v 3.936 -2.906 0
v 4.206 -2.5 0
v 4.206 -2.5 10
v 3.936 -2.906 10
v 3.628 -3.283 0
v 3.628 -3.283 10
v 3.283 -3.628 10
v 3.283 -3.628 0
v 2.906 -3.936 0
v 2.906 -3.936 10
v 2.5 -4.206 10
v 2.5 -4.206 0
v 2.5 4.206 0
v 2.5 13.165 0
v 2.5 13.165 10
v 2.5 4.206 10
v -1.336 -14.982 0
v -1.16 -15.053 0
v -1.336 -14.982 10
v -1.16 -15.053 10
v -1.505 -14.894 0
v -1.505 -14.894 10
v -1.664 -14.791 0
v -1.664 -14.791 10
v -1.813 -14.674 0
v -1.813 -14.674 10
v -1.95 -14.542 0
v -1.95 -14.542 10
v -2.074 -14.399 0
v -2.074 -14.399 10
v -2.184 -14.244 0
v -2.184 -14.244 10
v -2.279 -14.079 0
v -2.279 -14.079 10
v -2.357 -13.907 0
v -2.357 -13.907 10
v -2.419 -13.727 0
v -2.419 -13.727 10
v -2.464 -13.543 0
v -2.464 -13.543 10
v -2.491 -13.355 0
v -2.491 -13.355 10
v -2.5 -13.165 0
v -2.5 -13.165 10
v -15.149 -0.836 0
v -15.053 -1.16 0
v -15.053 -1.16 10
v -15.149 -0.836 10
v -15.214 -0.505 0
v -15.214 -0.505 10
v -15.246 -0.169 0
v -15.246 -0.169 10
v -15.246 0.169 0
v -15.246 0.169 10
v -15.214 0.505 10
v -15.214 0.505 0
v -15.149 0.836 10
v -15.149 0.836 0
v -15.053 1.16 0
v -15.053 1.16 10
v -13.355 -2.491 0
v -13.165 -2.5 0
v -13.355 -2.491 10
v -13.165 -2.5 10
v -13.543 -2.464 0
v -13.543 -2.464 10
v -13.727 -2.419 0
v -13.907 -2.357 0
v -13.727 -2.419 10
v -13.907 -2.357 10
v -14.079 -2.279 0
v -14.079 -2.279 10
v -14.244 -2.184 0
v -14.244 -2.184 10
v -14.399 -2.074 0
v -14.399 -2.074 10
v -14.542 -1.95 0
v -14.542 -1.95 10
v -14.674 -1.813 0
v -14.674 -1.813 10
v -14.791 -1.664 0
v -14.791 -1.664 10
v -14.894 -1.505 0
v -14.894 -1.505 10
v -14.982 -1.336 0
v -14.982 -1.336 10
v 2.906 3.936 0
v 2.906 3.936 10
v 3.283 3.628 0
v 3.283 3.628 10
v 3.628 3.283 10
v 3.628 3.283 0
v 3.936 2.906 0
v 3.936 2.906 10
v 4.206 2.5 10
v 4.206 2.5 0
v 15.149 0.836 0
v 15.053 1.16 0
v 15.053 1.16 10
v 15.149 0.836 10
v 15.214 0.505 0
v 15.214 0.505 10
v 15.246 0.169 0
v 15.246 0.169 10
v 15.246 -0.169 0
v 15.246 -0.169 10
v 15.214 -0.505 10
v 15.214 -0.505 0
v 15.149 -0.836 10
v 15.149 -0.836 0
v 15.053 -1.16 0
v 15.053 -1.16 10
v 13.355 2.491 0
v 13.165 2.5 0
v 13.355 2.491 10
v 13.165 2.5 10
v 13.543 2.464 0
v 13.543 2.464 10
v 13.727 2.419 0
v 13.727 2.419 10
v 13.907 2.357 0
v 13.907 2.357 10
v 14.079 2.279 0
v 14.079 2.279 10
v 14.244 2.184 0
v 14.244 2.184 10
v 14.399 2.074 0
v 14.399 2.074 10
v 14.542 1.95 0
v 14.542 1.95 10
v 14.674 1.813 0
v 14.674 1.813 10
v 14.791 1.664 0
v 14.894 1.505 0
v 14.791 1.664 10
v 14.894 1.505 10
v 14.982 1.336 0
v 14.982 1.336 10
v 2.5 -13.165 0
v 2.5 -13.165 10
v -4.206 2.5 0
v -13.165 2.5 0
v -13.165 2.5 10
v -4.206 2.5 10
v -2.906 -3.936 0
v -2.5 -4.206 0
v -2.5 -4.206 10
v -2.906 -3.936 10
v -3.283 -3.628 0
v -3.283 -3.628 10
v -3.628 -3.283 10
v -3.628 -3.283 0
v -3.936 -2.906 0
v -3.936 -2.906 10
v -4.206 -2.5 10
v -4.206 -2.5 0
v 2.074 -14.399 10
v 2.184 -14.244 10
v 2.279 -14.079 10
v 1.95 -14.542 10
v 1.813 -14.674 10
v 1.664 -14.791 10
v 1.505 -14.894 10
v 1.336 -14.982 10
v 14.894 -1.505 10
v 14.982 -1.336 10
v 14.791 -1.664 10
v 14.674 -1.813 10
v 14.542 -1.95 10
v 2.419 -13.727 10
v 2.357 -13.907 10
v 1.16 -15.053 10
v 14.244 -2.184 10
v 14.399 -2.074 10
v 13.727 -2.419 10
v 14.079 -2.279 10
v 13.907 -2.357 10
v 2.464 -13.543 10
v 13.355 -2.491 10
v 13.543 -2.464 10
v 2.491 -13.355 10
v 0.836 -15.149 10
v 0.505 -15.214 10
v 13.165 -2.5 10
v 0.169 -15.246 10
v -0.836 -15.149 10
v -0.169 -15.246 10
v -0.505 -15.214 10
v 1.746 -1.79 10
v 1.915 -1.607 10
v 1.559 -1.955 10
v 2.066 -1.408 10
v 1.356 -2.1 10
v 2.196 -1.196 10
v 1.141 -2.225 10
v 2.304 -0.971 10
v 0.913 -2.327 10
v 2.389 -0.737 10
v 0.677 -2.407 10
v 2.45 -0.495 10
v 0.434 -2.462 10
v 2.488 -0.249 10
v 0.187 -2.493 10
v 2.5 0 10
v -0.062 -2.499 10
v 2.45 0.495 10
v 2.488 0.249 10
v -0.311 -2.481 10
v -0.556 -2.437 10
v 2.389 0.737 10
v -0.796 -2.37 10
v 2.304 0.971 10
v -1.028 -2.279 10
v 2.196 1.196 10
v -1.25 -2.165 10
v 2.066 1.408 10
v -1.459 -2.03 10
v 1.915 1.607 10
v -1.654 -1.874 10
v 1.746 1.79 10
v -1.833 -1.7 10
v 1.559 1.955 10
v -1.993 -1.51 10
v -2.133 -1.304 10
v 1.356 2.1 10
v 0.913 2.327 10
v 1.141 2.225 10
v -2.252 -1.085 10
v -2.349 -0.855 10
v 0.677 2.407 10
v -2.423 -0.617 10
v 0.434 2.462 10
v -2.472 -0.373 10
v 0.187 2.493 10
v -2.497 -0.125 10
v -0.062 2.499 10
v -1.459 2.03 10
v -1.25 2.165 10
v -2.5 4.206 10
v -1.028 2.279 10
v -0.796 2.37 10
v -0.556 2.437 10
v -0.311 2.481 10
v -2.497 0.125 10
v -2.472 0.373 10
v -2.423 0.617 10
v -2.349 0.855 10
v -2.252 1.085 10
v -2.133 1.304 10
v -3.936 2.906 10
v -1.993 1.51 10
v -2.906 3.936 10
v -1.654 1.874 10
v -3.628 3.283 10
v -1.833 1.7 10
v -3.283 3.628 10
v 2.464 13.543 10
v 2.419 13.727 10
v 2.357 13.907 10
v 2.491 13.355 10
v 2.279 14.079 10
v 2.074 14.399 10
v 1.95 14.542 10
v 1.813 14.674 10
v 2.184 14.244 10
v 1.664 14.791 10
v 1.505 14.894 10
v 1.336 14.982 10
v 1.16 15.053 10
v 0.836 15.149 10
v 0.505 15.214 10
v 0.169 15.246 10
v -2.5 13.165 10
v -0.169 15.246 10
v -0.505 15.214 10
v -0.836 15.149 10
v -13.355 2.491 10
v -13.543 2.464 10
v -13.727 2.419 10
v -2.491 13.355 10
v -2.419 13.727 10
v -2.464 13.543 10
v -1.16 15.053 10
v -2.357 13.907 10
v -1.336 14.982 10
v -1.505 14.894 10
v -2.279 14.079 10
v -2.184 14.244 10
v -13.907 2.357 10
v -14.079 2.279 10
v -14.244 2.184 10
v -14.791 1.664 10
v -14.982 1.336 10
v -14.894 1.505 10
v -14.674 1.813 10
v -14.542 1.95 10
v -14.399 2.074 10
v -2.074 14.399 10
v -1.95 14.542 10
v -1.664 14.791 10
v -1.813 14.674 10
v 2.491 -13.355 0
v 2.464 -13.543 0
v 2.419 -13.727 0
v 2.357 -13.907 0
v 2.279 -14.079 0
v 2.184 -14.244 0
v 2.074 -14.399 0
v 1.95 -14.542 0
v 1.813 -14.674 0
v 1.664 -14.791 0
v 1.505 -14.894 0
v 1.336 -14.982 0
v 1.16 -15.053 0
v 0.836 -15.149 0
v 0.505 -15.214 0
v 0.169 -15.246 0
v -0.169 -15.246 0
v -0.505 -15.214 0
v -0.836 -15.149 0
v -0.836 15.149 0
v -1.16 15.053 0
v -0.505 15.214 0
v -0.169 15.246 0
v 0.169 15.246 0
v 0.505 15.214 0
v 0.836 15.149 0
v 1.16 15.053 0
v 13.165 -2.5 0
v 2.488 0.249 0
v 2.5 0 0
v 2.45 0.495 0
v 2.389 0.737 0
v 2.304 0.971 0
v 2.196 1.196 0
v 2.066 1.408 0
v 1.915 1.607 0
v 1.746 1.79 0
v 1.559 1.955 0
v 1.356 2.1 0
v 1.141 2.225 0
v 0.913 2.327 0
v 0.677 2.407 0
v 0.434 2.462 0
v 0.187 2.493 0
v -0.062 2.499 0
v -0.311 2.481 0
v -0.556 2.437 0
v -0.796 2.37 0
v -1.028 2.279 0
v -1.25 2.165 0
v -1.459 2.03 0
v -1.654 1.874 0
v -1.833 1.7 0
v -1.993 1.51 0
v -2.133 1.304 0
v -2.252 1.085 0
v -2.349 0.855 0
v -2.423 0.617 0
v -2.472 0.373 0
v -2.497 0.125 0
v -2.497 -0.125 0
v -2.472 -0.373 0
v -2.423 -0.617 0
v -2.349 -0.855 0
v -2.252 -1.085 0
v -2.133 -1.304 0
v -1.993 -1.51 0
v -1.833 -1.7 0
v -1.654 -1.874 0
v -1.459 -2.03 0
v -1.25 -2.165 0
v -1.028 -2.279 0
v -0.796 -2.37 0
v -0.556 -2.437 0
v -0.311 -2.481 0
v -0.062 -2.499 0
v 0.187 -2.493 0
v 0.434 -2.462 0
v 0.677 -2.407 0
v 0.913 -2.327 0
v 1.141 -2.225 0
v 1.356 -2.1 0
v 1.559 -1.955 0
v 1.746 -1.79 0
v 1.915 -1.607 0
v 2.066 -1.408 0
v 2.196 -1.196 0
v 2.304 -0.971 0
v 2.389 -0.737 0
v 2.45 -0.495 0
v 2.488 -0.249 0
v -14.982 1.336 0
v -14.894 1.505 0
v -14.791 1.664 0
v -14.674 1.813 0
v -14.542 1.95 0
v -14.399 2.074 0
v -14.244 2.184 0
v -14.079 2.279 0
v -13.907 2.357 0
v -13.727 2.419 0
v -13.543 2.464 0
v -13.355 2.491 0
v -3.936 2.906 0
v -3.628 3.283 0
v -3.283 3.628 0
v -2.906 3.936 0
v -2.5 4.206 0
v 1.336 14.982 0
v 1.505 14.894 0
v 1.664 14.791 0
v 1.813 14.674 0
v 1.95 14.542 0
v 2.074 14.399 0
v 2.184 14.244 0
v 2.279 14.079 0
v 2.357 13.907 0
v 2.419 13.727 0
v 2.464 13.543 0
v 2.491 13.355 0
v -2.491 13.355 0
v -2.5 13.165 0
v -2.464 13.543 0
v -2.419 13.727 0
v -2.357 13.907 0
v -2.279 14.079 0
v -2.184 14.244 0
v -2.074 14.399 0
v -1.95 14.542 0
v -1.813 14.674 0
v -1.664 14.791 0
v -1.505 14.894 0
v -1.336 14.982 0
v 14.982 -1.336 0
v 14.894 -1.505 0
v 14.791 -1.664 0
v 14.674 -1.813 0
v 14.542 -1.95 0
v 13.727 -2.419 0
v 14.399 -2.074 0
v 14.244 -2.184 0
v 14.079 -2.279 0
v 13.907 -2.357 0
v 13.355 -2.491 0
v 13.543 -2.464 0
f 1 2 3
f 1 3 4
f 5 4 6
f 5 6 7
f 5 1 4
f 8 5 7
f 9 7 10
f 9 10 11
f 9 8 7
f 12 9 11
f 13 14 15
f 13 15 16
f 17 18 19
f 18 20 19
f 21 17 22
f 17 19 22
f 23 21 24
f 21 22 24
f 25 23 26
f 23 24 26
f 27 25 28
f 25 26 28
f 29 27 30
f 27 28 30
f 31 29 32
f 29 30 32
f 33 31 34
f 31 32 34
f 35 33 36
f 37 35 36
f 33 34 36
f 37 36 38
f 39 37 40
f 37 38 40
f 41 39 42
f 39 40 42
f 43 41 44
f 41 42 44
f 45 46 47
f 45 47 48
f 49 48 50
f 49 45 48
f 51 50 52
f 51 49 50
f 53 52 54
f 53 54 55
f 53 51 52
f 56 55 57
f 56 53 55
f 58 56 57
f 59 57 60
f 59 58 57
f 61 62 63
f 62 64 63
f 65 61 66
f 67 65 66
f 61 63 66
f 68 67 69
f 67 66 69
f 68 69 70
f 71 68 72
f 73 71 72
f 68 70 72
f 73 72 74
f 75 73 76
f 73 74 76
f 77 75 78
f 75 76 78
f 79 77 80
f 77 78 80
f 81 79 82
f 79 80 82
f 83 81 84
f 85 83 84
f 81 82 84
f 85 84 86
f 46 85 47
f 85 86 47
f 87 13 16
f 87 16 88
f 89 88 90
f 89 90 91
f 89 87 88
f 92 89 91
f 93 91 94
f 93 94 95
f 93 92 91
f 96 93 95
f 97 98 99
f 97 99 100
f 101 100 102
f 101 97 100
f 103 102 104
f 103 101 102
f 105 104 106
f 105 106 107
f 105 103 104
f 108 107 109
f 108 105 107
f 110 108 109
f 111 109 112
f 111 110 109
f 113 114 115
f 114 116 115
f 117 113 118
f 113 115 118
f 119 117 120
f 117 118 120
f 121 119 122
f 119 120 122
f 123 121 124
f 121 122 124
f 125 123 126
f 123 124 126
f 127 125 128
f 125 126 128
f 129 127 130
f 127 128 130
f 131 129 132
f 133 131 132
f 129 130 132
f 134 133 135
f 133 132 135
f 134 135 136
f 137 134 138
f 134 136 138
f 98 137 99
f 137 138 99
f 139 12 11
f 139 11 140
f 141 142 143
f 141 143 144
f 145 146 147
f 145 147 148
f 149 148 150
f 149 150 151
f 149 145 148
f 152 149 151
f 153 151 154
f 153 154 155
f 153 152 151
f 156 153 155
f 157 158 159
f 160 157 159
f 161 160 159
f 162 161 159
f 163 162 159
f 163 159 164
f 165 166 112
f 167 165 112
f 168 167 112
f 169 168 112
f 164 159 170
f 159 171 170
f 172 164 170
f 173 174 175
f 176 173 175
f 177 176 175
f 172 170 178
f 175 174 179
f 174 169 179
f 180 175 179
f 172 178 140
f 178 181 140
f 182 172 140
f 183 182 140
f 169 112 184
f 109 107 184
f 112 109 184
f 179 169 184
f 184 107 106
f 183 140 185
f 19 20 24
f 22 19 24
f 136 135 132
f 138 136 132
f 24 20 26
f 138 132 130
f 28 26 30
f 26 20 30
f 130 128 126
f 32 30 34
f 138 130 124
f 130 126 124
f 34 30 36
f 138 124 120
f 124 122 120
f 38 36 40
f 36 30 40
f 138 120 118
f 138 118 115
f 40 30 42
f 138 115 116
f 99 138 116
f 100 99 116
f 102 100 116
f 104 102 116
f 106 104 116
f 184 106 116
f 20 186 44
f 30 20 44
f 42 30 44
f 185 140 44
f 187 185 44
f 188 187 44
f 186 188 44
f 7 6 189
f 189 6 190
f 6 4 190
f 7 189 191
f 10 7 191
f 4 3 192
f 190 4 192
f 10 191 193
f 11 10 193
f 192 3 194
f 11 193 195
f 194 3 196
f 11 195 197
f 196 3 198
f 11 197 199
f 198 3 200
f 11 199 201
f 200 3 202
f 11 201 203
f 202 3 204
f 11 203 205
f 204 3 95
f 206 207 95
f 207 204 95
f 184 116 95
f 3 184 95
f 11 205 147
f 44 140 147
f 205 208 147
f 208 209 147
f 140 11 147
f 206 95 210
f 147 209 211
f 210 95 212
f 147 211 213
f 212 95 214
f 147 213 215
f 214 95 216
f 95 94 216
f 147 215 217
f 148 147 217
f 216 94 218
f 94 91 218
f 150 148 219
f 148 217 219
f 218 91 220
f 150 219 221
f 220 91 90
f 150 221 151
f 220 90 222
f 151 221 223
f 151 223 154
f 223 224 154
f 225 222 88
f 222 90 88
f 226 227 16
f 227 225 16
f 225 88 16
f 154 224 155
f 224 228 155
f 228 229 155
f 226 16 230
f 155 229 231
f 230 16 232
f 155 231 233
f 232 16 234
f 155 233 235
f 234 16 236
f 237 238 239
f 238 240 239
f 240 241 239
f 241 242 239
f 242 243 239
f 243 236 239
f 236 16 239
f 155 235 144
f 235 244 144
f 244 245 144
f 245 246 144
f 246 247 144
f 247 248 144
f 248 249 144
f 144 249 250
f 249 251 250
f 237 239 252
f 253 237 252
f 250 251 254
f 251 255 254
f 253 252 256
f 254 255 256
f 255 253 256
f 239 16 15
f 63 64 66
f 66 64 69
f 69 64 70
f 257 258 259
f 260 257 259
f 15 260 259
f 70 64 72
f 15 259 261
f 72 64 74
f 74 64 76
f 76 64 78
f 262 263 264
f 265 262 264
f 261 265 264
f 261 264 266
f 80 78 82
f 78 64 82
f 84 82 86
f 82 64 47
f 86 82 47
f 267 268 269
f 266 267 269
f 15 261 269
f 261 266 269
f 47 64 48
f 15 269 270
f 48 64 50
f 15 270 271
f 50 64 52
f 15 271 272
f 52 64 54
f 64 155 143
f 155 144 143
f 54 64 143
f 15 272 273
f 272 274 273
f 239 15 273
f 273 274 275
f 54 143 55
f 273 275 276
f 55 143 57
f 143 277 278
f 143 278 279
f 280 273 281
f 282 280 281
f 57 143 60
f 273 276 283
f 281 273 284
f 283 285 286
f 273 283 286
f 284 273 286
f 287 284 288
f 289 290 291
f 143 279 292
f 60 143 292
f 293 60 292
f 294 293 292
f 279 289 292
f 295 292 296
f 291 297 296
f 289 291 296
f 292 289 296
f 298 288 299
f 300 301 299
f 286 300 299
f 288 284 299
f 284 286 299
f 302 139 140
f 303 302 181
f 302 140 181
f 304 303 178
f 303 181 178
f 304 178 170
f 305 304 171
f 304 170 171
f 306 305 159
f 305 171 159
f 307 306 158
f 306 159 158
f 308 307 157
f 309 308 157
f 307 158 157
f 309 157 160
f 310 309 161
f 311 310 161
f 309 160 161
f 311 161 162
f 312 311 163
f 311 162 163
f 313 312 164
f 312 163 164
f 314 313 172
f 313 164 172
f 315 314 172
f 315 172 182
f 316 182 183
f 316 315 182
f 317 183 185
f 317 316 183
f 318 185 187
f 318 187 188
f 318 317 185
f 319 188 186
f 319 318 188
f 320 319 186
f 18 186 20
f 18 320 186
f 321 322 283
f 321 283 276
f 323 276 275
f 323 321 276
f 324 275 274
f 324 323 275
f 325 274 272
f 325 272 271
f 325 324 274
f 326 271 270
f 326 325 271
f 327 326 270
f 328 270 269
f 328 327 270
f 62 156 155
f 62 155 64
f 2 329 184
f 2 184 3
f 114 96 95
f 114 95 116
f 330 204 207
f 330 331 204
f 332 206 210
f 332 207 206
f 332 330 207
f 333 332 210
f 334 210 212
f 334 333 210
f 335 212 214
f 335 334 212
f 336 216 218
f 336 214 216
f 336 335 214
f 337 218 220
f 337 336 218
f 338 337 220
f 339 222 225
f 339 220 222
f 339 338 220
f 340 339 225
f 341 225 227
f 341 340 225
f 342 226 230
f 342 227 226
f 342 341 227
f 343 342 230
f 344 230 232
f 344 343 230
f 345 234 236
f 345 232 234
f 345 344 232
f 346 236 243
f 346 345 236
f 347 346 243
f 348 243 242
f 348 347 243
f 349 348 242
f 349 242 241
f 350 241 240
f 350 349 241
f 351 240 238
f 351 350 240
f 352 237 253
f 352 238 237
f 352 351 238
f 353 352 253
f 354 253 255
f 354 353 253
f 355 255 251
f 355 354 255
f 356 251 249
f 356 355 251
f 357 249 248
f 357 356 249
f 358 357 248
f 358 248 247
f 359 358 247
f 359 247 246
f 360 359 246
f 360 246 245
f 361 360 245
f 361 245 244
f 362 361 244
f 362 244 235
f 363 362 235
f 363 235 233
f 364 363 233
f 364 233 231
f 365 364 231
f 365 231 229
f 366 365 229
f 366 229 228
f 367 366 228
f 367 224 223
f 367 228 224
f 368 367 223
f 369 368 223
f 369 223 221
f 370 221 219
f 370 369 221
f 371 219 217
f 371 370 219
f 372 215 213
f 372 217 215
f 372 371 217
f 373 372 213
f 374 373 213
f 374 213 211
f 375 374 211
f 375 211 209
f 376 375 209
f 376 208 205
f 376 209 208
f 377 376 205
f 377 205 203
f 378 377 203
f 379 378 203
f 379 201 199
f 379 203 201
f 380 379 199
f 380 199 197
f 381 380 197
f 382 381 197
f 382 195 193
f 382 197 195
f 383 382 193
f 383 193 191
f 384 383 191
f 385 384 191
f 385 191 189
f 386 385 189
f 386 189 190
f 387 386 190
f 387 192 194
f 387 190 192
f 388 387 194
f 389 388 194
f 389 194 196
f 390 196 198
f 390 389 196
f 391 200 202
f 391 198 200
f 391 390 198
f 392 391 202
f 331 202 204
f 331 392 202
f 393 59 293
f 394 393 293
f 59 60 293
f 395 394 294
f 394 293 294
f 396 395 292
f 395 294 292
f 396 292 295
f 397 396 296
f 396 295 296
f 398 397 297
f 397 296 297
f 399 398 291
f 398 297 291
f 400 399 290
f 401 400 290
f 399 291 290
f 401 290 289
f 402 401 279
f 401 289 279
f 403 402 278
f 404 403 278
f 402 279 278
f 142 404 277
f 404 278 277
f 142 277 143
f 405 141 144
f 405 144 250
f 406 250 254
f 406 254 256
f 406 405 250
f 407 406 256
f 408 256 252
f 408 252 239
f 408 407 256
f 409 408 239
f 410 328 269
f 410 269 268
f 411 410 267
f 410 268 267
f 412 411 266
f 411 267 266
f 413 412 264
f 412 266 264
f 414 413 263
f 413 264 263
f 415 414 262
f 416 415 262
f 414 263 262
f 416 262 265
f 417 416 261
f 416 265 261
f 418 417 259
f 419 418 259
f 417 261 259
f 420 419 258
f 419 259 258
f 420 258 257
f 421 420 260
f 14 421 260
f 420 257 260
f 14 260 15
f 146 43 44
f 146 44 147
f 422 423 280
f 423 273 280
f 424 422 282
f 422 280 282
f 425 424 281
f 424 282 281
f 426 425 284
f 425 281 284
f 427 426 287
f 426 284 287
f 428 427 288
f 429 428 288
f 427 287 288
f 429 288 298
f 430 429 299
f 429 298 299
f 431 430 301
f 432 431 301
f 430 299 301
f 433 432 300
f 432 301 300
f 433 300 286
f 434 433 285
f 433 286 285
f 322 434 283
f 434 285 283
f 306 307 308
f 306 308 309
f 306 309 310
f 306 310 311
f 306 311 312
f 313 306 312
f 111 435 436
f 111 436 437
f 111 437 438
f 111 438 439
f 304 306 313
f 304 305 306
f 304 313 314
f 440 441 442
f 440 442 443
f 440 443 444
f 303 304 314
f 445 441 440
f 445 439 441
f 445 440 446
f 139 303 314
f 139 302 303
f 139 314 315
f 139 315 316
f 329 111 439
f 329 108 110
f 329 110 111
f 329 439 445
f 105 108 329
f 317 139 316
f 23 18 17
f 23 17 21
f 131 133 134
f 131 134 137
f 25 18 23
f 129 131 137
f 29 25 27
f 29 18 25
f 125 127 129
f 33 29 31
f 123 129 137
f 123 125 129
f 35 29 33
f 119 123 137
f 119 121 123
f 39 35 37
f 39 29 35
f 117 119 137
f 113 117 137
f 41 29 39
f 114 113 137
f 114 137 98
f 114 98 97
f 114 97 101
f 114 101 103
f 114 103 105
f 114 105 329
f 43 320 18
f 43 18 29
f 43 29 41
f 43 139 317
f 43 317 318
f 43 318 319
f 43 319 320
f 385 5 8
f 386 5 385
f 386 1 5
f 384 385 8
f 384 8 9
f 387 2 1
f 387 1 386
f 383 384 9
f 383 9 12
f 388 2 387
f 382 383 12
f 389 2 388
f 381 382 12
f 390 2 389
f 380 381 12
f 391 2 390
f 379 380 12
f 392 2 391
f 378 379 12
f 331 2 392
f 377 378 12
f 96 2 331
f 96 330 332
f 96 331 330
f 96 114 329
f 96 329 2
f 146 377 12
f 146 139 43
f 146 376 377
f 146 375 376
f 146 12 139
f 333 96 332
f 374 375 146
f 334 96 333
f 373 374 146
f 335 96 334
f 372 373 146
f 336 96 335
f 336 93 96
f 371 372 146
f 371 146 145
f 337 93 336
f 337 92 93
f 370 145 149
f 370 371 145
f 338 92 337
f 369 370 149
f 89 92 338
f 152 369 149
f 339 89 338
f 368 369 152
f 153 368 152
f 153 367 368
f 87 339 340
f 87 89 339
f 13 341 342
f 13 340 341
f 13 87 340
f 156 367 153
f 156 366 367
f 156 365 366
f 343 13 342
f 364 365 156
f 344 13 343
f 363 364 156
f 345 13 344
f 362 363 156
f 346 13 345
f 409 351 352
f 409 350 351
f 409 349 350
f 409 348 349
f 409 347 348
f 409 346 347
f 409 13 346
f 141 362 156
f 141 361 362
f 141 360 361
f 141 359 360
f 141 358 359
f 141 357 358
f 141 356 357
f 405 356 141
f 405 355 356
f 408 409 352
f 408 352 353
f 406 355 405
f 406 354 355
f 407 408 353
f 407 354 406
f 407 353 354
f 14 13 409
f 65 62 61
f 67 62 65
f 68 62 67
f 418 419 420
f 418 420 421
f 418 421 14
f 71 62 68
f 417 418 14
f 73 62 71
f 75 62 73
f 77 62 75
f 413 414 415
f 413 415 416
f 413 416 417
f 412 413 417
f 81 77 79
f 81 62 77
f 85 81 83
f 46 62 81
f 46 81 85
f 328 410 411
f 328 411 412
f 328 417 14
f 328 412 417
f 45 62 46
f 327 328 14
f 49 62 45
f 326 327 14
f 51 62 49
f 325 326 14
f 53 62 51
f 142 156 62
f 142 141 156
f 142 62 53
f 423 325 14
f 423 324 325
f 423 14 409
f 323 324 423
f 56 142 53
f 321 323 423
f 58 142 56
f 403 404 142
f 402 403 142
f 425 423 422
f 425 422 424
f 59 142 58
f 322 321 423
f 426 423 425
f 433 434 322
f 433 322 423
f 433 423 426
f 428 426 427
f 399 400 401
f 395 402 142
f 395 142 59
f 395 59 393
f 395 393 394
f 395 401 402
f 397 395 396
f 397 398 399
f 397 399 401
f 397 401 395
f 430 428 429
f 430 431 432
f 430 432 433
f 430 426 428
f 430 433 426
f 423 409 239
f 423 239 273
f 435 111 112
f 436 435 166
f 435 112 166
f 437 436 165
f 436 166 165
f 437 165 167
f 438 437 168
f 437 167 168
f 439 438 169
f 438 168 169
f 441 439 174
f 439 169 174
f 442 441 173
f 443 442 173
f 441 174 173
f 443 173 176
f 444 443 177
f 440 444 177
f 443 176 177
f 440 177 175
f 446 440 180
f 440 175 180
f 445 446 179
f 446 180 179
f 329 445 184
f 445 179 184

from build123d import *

# Parameters (mm, degrees)
BOSS_EXTRUDE1_DEPTH     = 10
FILLET1_R               = 2
CUT_EXTRUDE1_DEPTH      = 24.772357897
CUT_EXTRUDE1_DEPTH_BACK = 24.772357897
SKETCH4_R               = 2.5


with BuildPart() as part:
    # Sketch3 → Boss-Extrude1 (new body)
    with BuildSketch(Plane.XY):
        with BuildLine():
            Line((-2.5, 4.205809256), (-2.5, 14.205809256))
            ThreePointArc((-2.5, 14.205809256), (0, 15.25), (2.5, 14.205809256))
            Line((2.5, 14.205809256), (2.5, 4.205809256))
            ThreePointArc((2.5, 4.205809256), (3.459684342, 3.459684342), (4.205809256, 2.5))
            Line((4.205809256, 2.5), (14.205809256, 2.5))
            ThreePointArc((14.205809256, 2.5), (15.25, 0), (14.205809256, -2.5))
            Line((14.205809256, -2.5), (4.205809256, -2.5))
            ThreePointArc((4.205809256, -2.5), (3.459684342, -3.459684342), (2.5, -4.205809256))
            Line((2.5, -4.205809256), (2.5, -14.205809256))
            ThreePointArc((2.5, -14.205809256), (0, -15.25), (-2.5, -14.205809256))
            Line((-2.5, -14.205809256), (-2.5, -4.205809256))
            ThreePointArc((-2.5, -4.205809256), (-3.459684342, -3.459684342), (-4.205809256, -2.5))
            Line((-4.205809256, -2.5), (-14.205809256, -2.5))
            ThreePointArc((-14.205809256, -2.5), (-15.25, 0), (-14.205809256, 2.5))
            Line((-14.205809256, 2.5), (-4.205809256, 2.5))
            ThreePointArc((-4.205809256, 2.5), (-3.459684342, 3.459684342), (-2.5, 4.205809256))
        make_face()
    extrude(amount=BOSS_EXTRUDE1_DEPTH)

    # Fillet1
    fillet1_edges = [part.edges().sort_by_distance(p)[0] for p in [
        (-2.5, 14.205809256, 5),
        (2.5, 14.205809256, 5),
        (14.205809256, 2.5, 5),
        (14.205809256, -2.5, 5),
        (2.5, -14.205809256, 5),
        (-2.5, -14.205809256, 5),
        (-14.205809256, -2.5, 5),
        (-14.205809256, 2.5, 5),
    ]]
    fillet(fillet1_edges, radius=FILLET1_R)

    # Sketch4 → Cut-Extrude1 (cut, two sides: drawn at the far end of the back side and taken through both)
    with BuildSketch(Plane.XY.offset(-CUT_EXTRUDE1_DEPTH_BACK)):
        Circle(SKETCH4_R)
    extrude(amount=CUT_EXTRUDE1_DEPTH + CUT_EXTRUDE1_DEPTH_BACK, mode=Mode.SUBTRACT)


solid = part.part
